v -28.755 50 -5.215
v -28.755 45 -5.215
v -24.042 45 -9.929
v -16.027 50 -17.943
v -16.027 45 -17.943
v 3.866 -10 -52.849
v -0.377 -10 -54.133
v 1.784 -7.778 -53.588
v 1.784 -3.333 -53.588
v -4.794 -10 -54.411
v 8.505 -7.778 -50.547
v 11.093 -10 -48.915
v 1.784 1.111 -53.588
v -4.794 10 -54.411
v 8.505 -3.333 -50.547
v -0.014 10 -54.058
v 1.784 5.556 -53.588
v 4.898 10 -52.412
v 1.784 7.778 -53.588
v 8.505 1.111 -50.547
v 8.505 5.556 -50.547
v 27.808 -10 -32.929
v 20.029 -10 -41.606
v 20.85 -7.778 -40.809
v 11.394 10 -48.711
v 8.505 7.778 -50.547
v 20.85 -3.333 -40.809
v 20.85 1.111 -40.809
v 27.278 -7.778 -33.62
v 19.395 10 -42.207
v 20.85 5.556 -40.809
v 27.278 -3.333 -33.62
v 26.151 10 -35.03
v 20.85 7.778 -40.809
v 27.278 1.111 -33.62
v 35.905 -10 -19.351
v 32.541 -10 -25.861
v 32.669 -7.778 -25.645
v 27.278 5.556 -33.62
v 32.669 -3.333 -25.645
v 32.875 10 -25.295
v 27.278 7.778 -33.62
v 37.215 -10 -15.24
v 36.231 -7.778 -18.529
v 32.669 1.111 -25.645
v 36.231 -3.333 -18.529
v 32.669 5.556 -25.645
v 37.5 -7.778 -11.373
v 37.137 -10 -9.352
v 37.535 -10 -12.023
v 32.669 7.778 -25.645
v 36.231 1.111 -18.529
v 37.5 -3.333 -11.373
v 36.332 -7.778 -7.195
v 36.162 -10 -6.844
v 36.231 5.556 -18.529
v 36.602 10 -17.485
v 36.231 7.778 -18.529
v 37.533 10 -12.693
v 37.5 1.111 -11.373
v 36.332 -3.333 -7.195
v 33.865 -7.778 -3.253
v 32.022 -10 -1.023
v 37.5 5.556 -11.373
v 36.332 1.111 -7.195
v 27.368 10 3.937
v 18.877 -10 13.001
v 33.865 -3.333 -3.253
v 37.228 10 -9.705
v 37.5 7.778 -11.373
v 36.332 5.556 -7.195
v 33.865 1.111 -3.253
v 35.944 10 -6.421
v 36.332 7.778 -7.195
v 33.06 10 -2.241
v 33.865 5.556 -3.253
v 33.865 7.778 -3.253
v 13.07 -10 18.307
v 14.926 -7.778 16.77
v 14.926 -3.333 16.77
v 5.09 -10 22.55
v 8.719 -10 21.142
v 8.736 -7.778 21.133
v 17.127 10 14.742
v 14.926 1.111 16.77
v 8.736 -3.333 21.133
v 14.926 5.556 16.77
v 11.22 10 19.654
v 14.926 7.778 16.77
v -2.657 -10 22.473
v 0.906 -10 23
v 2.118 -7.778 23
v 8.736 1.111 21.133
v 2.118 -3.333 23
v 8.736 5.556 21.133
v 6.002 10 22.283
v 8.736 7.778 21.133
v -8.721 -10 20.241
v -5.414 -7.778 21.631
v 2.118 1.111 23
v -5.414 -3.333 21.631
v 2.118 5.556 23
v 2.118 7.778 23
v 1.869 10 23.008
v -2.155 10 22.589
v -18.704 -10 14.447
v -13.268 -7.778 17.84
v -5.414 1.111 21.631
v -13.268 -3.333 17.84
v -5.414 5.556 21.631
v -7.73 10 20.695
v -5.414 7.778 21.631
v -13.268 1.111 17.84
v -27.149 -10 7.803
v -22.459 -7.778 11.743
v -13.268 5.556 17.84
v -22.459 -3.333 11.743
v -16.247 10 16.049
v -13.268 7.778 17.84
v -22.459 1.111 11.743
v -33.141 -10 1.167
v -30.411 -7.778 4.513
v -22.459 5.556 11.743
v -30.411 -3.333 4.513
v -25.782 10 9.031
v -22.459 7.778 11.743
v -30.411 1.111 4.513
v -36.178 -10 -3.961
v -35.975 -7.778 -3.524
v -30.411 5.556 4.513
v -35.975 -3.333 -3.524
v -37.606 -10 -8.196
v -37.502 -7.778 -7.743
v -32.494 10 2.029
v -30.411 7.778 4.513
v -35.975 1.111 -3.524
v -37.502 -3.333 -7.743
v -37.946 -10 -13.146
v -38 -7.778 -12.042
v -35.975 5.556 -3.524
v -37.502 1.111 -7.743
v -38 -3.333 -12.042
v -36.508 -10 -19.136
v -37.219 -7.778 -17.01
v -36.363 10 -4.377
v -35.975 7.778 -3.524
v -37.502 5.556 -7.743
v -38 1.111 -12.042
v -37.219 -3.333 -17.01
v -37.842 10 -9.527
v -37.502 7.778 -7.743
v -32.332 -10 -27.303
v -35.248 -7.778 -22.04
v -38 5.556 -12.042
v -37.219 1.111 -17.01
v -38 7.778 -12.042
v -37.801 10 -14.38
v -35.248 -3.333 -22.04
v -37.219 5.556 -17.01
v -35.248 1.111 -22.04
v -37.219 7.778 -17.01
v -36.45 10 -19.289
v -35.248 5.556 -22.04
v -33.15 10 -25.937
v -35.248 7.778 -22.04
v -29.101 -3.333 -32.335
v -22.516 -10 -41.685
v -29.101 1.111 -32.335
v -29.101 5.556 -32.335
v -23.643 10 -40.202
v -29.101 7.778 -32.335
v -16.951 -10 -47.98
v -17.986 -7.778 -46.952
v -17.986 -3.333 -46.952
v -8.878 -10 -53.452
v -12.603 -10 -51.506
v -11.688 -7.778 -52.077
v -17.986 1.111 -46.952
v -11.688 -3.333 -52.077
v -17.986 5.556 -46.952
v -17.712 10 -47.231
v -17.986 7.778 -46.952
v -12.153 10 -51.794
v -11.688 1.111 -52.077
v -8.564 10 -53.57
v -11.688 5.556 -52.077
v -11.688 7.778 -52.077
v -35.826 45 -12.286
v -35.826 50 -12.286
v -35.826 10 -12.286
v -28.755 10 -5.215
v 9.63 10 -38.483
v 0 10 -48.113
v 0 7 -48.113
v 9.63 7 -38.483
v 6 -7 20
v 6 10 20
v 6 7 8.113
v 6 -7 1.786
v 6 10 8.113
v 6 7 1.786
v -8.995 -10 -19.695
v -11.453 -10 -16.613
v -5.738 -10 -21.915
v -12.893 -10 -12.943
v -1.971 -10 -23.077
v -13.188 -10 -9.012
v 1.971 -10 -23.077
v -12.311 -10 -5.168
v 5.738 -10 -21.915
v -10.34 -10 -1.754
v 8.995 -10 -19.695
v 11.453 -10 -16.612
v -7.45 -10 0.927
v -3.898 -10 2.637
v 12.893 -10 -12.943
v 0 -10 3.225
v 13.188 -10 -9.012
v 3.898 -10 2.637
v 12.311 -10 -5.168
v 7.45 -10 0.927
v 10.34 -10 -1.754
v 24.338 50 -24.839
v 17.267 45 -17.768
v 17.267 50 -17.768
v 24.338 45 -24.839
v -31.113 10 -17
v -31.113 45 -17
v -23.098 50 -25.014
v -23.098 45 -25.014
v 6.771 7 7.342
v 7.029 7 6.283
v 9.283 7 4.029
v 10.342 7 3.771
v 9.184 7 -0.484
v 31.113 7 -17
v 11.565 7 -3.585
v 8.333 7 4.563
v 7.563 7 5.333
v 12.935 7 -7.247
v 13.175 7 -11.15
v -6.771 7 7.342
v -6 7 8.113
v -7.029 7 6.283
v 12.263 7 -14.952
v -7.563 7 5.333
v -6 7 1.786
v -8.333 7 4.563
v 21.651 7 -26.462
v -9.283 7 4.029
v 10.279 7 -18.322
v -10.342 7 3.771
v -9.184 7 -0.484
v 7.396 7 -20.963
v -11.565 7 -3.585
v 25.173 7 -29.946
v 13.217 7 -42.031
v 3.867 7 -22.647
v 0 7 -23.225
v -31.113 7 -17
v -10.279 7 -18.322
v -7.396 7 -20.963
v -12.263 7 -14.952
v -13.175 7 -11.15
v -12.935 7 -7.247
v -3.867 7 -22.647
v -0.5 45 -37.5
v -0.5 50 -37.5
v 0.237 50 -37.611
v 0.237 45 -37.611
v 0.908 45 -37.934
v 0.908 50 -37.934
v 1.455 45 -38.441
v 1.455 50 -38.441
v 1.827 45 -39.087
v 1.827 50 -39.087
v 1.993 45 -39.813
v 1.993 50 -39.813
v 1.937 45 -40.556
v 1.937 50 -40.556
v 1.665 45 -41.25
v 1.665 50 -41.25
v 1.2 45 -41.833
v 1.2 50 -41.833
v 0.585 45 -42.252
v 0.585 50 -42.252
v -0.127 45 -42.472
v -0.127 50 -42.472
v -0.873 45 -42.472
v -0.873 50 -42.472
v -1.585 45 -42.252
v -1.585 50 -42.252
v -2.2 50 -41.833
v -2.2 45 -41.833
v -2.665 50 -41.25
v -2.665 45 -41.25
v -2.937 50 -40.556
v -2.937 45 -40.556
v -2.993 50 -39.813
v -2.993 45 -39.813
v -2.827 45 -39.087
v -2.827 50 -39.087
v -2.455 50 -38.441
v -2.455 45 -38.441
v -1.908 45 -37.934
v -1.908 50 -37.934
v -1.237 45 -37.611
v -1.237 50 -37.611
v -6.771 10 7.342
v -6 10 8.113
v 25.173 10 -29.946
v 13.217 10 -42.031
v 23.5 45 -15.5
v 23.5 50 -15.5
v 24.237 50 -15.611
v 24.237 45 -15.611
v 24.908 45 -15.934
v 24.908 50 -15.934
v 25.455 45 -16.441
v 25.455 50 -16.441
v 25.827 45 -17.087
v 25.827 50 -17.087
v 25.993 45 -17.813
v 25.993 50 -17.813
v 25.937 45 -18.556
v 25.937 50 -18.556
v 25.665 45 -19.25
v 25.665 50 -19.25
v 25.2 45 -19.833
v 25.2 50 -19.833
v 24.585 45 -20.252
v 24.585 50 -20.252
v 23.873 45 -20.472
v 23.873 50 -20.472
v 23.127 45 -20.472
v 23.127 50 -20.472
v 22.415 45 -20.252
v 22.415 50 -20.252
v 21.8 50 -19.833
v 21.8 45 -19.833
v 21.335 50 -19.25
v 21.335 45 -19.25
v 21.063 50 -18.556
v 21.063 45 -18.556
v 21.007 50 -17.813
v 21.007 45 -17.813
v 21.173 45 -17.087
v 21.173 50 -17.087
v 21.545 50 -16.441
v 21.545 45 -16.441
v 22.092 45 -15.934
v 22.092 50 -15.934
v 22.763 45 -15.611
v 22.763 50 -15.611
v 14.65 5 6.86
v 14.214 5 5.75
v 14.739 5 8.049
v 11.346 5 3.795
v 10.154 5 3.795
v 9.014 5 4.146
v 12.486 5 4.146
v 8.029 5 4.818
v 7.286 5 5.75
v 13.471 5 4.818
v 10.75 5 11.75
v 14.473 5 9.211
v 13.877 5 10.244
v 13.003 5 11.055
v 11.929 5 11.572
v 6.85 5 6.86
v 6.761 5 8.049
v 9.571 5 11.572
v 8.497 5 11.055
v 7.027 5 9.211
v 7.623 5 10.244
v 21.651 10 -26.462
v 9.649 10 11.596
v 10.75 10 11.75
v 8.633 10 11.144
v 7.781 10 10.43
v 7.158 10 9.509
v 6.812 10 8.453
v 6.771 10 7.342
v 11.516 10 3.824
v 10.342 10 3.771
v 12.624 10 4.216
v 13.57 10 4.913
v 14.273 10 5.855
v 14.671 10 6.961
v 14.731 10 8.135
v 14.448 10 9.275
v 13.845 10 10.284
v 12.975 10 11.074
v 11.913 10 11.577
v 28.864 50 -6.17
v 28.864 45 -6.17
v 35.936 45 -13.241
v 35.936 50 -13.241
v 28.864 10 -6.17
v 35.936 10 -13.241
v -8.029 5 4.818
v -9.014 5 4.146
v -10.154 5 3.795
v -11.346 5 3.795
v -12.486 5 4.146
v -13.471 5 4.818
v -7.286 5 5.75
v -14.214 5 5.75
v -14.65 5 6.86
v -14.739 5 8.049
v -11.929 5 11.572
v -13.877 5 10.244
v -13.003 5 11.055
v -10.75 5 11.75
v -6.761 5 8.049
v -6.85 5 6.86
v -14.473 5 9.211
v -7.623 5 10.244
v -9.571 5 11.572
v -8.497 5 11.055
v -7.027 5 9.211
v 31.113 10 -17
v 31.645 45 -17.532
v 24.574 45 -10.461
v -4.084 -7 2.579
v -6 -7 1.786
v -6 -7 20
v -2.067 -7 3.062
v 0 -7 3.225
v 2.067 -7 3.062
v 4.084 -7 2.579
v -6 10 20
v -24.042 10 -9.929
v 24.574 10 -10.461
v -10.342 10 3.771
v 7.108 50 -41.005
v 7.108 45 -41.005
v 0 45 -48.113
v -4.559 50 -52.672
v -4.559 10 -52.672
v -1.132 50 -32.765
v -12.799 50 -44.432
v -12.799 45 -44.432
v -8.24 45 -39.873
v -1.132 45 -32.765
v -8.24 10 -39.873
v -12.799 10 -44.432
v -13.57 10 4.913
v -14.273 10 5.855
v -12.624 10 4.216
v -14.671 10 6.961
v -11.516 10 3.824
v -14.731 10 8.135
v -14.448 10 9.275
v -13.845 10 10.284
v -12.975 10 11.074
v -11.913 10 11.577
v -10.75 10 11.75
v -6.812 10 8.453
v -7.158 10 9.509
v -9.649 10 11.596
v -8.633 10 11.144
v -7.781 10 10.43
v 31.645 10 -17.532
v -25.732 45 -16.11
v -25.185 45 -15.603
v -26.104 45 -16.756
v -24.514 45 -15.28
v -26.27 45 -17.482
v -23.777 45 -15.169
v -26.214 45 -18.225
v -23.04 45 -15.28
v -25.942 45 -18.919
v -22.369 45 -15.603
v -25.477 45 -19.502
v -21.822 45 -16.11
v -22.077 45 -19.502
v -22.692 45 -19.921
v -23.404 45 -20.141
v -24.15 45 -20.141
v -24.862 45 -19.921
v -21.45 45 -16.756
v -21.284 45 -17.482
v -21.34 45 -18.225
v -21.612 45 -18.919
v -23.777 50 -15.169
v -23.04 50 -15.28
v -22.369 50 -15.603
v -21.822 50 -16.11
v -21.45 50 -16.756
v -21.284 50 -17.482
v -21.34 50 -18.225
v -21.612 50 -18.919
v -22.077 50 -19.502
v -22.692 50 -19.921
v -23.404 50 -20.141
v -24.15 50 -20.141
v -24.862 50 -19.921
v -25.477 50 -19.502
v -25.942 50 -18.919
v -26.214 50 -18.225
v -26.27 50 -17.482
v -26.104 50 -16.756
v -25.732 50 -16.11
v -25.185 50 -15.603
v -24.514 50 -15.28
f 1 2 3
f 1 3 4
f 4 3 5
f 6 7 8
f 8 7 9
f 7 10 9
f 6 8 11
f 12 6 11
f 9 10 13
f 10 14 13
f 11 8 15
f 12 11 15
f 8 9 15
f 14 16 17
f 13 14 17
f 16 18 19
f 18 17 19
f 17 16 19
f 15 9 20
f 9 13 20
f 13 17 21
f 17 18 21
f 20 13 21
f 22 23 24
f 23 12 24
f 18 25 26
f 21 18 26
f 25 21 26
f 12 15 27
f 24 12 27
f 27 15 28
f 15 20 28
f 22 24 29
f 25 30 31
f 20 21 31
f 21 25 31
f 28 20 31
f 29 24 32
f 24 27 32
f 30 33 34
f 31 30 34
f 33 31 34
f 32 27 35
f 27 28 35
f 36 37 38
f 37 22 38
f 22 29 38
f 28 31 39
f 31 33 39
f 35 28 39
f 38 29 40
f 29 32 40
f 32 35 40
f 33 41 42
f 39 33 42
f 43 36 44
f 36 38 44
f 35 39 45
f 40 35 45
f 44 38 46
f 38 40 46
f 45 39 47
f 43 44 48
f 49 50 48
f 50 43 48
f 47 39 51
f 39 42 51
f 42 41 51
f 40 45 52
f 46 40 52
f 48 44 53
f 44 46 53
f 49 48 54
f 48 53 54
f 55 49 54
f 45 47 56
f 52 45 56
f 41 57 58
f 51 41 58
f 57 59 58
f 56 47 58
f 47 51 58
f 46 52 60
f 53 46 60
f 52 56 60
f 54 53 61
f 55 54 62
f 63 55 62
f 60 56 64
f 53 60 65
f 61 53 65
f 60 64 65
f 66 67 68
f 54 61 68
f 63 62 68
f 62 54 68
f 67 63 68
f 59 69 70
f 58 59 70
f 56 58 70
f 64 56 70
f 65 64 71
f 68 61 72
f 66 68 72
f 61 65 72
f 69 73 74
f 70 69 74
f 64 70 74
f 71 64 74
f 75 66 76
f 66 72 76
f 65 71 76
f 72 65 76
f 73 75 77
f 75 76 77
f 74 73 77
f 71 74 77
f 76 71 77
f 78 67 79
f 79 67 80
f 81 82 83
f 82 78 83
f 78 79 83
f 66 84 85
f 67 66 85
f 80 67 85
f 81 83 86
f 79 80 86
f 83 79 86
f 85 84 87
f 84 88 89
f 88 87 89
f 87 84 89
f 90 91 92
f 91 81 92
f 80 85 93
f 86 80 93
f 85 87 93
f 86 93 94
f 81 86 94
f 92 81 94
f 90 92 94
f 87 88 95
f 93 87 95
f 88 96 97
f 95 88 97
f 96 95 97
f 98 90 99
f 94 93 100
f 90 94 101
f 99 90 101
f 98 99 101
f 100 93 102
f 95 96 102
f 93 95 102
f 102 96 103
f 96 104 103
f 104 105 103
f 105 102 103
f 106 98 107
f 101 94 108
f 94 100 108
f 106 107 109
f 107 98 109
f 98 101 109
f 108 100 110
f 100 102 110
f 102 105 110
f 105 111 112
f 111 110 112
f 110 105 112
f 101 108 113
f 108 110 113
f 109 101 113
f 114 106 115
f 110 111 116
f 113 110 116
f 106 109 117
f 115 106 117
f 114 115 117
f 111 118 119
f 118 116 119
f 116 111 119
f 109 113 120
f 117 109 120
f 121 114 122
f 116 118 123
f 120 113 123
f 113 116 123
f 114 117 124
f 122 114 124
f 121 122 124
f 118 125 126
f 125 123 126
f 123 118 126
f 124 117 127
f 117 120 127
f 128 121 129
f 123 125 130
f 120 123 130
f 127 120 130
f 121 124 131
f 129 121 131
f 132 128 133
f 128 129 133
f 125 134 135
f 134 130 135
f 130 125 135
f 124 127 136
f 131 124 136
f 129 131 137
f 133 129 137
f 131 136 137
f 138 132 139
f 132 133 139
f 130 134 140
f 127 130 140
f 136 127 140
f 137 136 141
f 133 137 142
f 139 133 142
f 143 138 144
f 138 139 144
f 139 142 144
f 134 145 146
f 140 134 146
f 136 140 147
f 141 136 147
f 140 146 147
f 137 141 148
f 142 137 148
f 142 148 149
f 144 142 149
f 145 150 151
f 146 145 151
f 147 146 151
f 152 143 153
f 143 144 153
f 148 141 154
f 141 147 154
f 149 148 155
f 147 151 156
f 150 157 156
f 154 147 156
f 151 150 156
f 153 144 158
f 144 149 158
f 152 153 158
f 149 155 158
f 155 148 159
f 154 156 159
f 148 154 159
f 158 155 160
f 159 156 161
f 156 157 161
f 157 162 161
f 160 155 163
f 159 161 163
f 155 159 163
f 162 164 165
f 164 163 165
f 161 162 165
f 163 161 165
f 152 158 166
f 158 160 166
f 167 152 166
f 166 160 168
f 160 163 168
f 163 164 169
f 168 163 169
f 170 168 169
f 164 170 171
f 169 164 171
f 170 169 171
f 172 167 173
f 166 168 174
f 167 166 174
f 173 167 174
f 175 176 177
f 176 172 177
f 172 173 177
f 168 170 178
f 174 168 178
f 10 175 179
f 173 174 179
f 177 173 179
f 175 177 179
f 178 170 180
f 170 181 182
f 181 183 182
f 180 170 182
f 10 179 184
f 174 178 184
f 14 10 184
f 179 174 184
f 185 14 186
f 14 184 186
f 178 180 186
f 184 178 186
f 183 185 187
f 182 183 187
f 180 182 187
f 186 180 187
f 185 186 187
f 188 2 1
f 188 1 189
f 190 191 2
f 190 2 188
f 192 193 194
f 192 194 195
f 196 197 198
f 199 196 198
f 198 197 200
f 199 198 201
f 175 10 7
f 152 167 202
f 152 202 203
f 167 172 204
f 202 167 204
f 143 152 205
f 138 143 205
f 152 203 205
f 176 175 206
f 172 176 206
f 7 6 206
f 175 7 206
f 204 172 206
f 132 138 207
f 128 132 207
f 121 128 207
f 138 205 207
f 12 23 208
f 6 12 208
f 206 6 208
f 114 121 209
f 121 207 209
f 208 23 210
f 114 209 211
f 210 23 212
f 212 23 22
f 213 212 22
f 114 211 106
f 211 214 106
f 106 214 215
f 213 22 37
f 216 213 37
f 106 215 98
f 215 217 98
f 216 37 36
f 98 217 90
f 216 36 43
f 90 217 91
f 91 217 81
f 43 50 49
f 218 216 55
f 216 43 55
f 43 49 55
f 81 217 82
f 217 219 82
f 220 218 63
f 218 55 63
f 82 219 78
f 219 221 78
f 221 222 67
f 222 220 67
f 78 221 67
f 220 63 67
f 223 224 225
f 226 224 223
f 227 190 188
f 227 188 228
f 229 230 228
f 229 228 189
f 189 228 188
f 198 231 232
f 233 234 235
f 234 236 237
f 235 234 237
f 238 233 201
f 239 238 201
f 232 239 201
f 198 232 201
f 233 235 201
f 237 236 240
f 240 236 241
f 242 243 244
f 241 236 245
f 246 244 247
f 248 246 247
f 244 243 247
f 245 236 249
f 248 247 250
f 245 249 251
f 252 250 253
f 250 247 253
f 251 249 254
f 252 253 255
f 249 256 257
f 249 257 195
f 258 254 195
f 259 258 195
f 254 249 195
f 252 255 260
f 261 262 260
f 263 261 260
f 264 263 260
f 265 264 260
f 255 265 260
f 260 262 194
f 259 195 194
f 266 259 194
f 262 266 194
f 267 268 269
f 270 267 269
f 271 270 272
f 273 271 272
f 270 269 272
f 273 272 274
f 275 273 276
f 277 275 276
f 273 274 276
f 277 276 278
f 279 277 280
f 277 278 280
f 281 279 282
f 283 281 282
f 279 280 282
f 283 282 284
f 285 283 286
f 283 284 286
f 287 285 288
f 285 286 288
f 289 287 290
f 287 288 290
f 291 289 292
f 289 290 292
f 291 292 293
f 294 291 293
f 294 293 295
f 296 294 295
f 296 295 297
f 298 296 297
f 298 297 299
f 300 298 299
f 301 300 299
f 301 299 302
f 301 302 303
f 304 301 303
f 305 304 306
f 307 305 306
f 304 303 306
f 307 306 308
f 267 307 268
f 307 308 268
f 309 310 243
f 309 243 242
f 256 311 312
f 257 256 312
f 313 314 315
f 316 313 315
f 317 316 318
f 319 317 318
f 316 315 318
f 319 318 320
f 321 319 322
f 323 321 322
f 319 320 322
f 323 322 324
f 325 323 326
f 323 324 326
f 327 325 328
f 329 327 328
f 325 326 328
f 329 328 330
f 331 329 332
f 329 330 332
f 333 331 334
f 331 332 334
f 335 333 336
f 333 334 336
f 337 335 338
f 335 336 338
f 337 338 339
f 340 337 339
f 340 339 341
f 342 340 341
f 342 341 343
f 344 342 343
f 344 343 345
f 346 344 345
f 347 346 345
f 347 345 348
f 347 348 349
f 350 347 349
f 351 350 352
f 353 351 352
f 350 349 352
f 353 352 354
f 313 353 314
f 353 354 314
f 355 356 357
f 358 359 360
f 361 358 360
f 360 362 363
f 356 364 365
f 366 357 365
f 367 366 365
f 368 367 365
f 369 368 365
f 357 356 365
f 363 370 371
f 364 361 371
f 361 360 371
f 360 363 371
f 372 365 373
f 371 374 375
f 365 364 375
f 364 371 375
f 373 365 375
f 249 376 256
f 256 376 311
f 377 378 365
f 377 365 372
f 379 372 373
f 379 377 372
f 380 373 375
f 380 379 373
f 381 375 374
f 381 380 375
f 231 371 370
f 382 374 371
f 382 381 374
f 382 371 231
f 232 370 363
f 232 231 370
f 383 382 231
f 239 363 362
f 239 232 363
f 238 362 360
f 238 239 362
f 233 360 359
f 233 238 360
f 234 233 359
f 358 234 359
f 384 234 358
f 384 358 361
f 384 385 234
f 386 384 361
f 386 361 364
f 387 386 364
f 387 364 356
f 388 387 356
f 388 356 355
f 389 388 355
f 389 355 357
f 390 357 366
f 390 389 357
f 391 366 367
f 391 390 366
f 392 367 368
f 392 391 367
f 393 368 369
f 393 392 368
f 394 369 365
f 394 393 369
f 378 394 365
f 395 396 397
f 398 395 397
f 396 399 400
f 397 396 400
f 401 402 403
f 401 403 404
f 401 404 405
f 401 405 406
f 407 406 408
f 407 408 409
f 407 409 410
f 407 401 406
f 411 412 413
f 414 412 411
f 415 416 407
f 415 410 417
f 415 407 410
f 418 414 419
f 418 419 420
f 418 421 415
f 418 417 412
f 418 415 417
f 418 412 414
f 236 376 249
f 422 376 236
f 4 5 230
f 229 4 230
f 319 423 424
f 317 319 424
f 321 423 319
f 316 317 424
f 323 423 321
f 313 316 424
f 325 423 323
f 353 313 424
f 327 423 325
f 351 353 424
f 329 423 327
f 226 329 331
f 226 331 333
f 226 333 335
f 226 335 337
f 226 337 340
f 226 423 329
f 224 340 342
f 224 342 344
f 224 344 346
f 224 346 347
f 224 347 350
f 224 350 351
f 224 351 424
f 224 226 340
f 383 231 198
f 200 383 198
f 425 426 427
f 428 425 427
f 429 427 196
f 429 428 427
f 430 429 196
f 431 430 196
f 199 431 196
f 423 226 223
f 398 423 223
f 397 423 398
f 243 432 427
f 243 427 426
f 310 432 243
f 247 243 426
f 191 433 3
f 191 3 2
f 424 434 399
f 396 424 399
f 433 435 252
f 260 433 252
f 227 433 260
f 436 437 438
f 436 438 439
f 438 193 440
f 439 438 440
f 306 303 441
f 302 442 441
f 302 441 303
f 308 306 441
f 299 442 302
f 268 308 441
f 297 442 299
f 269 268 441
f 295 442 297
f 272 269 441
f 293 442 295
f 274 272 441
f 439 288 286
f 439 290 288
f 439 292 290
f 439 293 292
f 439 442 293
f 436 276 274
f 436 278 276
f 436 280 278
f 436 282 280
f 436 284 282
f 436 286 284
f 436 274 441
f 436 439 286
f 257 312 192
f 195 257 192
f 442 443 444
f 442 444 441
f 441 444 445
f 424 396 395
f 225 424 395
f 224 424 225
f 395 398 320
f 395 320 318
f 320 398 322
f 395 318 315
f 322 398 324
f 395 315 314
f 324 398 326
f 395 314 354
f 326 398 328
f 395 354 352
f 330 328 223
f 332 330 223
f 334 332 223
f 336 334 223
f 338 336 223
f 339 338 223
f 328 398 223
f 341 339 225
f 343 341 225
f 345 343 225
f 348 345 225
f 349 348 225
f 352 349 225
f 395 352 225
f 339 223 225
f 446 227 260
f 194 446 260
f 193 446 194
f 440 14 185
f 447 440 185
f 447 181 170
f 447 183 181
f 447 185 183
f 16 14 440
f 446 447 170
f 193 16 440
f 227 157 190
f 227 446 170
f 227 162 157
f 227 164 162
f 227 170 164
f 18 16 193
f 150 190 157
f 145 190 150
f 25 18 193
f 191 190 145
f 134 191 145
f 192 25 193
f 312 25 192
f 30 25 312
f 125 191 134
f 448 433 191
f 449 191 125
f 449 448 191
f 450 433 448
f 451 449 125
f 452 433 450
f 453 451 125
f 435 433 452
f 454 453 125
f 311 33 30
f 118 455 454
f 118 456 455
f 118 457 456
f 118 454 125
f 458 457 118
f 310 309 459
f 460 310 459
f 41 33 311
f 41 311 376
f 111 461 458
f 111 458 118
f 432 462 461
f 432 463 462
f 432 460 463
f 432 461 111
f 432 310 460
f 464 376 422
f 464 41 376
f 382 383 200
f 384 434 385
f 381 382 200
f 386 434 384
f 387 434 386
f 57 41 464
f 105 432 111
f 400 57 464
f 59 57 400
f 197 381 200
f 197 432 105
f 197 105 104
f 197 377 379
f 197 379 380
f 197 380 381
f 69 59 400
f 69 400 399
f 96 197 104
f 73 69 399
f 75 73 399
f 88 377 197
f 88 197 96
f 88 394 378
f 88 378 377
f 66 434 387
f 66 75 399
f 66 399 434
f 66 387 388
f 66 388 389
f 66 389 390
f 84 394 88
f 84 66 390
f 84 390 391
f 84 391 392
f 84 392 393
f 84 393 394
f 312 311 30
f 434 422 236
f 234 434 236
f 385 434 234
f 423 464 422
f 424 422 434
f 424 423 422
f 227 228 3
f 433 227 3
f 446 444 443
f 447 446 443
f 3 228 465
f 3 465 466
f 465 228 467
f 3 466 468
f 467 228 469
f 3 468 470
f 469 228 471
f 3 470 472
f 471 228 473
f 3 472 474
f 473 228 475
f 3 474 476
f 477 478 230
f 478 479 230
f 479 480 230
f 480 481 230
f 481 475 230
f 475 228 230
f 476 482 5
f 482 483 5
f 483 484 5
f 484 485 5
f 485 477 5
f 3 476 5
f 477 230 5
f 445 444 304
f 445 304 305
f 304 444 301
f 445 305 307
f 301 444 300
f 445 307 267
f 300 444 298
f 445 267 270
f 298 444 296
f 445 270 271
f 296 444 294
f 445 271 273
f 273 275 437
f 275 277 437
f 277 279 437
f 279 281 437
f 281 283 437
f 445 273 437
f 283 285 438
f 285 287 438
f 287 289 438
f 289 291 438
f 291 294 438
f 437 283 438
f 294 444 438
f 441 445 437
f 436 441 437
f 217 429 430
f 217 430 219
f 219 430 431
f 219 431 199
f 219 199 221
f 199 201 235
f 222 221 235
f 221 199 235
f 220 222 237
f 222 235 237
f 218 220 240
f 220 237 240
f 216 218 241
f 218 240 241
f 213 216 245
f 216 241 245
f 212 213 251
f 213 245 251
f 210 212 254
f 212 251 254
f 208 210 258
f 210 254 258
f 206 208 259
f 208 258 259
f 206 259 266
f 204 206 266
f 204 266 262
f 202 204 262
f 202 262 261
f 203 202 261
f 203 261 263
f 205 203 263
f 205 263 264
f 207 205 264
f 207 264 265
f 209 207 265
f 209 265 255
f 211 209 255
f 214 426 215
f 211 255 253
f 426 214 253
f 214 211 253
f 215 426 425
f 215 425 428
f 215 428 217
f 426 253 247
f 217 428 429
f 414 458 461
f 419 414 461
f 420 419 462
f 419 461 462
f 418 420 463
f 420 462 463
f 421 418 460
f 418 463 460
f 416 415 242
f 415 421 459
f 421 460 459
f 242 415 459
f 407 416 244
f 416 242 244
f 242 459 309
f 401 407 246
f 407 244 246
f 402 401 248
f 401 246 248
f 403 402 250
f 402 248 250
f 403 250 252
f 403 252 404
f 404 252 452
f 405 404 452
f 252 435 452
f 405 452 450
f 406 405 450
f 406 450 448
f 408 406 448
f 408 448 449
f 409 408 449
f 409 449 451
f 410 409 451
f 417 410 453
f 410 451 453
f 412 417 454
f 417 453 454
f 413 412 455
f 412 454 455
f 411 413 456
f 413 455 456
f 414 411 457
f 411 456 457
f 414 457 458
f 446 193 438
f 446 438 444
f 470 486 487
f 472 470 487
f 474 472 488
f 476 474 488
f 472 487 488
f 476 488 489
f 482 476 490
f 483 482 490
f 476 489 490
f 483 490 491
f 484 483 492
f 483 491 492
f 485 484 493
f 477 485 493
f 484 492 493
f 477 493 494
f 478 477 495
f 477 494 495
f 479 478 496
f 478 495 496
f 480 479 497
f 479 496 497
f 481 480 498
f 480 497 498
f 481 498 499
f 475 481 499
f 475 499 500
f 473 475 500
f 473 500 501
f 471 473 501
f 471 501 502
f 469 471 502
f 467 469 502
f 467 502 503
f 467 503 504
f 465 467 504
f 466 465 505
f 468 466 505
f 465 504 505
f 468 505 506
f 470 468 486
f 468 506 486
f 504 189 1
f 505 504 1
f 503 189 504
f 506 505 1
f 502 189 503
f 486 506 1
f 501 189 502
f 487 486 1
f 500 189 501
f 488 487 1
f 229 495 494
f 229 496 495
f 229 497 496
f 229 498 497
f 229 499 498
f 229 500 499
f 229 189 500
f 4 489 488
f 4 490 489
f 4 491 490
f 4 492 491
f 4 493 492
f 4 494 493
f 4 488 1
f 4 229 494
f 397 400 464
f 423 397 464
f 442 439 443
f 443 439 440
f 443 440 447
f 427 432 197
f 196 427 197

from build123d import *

# Parameters (mm, degrees)
BOSS_EXTRUDE1_DEPTH      = 10
BOSS_EXTRUDE1_DEPTH_BACK = 10
SKETCH2_R                = 60
SKETCH7_R                = 4
CUT_EXTRUDE2_DEPTH       = 5
CUT_EXTRUDE4_DEPTH       = 3
CUT_EXTRUDE5_DEPTH       = 3
BOSS_EXTRUDE2_DEPTH      = 35
BOSS_EXTRUDE3_DEPTH      = 5
SKETCH13_R               = 2.5
CUT_EXTRUDE7_DEPTH       = 5
SKETCH15_R               = 2.5
CUT_EXTRUDE8_DEPTH       = 5
SKETCH14_R               = 2.5
CUT_EXTRUDE9_DEPTH       = 5
SKETCH16_R               = 60
CUT_EXTRUDE10_DEPTH      = 38
SKETCH4_R                = 13.225
CUT_EXTRUDE12_DEPTH      = 42
SKETCH19_W               = 12
SKETCH19_H               = 20
CUT_EXTRUDE13_DEPTH      = 17


with BuildPart() as part:
    # Sketch2 → Boss-Extrude1 (new, two sides: drawn at the far end of the back side and taken through both)
    with BuildSketch(Plane(origin=(0, 0, 0), x_dir=(1, 0, 0), z_dir=(0, 1, 0)).offset(-BOSS_EXTRUDE1_DEPTH_BACK)):
        with Locations(Location((0, 0, 0), (0, 0, 270))):
            Circle(SKETCH2_R)
    extrude(amount=BOSS_EXTRUDE1_DEPTH + BOSS_EXTRUDE1_DEPTH_BACK)

    # Sketch7 → Cut-Extrude2 (cut)
    with BuildSketch(Plane(origin=(0, 10, 0), x_dir=(1, 0, 0), z_dir=(0, 1, 0))):
        with Locations(Location((-10.75, -7.75, 0), (0, 0, 270))):
            Circle(SKETCH7_R)
    cut_extrude2 = extrude(amount=-CUT_EXTRUDE2_DEPTH, mode=Mode.SUBTRACT)

    # Mirror1: Cut-Extrude2 across plane
    add(cut_extrude2.mirror(Plane(origin=(0, 0, 0), x_dir=(0, 0, 1), z_dir=(1, 0, 0))), mode=Mode.SUBTRACT)

    # Sketch9 → Cut-Extrude4 (cut)
    with BuildSketch(Plane(origin=(0, 10, 0), x_dir=(1, 0, 0), z_dir=(0, 1, 0))):
        Polygon((-31.112706744, 17), (-8.372e-06, 48.112698372), (31.11269, 17), (-8.372e-06, -14.112698372), align=None)
    extrude(amount=-CUT_EXTRUDE4_DEPTH, mode=Mode.SUBTRACT)

    # Sketch6 → Cut-Extrude5 (cut)
    with BuildSketch(Plane(origin=(0, 10, 0), x_dir=(1, 0, 0), z_dir=(0, 1, 0))):
        Polygon((-5.977874391, 23.042765738), (5.977874391, 10.957234262), (25.17254203, 29.945776443), (13.216793249, 42.03130792), align=None)
    extrude(amount=-CUT_EXTRUDE5_DEPTH, mode=Mode.SUBTRACT)

    # Sketch11 → Boss-Extrude2 (add)
    with BuildSketch(Plane(origin=(0, 10, 0), x_dir=(1, 0, 0), z_dir=(0, 1, 0))):
        Polygon((-8.372e-06, 48.112698372), (-8.240017503, 39.872689242), (-12.799306685, 44.431978425), (-4.559297555, 52.671987555), align=None)
        Polygon((-31.112706744, 17), (-24.041638933, 9.928932188), (-28.755220541, 5.21535058), (-35.826288353, 12.286418392), align=None)
        Polygon((31.644591703, 17.531901703), (24.573523891, 10.460833891), (28.864455193, 6.169902588), (35.935523005, 13.2409704), align=None)
    extrude(amount=BOSS_EXTRUDE2_DEPTH)

    # Sketch12 → Boss-Extrude3 (add)
    with BuildSketch(Plane(origin=(0, 45, 0), x_dir=(1, 0, 0), z_dir=(0, 1, 0))):
        Polygon((-4.559297555, 52.671987555), (-12.799306685, 44.431978425), (-1.132044796, 32.764716535), (7.107964335, 41.004725665), align=None)
        Polygon((-35.826288353, 12.286418392), (-28.755220541, 5.21535058), (-16.027298479, 17.943272641), (-23.098366291, 25.014340453), align=None)
        Polygon((35.935523005, 13.2409704), (28.864455193, 6.169902588), (17.266701717, 17.767656064), (24.337769529, 24.838723876), align=None)
    extrude(amount=BOSS_EXTRUDE3_DEPTH)

    # Sketch13 → Cut-Extrude7 (cut)
    with BuildSketch(Plane(origin=(0, 50, 0), x_dir=(1, 0, 0), z_dir=(0, 1, 0))):
        with Locations(Location((-0.5, 40, 0), (0, 0, 270))):
            Circle(SKETCH13_R)
    extrude(amount=-CUT_EXTRUDE7_DEPTH, mode=Mode.SUBTRACT)

    # Sketch15 → Cut-Extrude8 (cut)
    with BuildSketch(Plane(origin=(0, 50, 0), x_dir=(1, 0, 0), z_dir=(0, 1, 0))):
        with Locations(Location((-23.777002133, 17.668993601, 0), (0, 0, 270))):
            Circle(SKETCH15_R)
    extrude(amount=-CUT_EXTRUDE8_DEPTH, mode=Mode.SUBTRACT)

    # Sketch14 → Cut-Extrude9 (cut)
    with BuildSketch(Plane(origin=(0, 50, 0), x_dir=(1, 0, 0), z_dir=(0, 1, 0))):
        with Locations(Location((23.5, 18, 0), (0, 0, 270))):
            Circle(SKETCH14_R)
    extrude(amount=-CUT_EXTRUDE9_DEPTH, mode=Mode.SUBTRACT)

    # Sketch16 → Cut-Extrude10 (cut)
    with BuildSketch(Plane(origin=(0, 10, 0), x_dir=(1, 0, 0), z_dir=(0, 1, 0))):
        Circle(SKETCH16_R)
        with BuildLine():
            add(Edge.make_bspline(
                [(-4.79445414, 54.411479542), (3.711953261, 55.123778385), (20.176812176, 43.163893552), (32.095851639, 27.739664068), (41.103501035, 9.384731909), (23.441378071, -7.012281145), (7.387216057, -27.669539214), (-20.675561177, -15.265601832), (-45.215914175, 6.863059518), (-27.534475147, 35.312307502), (-14.416385352, 53.60577037), (-4.79445414, 54.411479542)],
                knots=[0, 0, 0, 0, 0.129983166, 0.216069769, 0.283536175, 0.368923683, 0.507401419, 0.580069943, 0.753753629, 0.852970941, 1, 1, 1, 1], degree=3))
        make_face(mode=Mode.SUBTRACT)
    extrude(amount=-CUT_EXTRUDE10_DEPTH, mode=Mode.SUBTRACT)

    # Sketch4 → Cut-Extrude12 (cut)
    with BuildSketch(Plane(origin=(0, 10, 0), x_dir=(1, 0, 0), z_dir=(0, 1, 0))):
        with Locations(Location((0, 10, 0), (0, 0, 270))):
            Circle(SKETCH4_R)
    extrude(amount=-CUT_EXTRUDE12_DEPTH, mode=Mode.SUBTRACT)

    # Sketch19 → Cut-Extrude13 (cut)
    with BuildSketch(Plane(origin=(0, 10, 0), x_dir=(1, 0, 0), z_dir=(0, 1, 0))):
        with Locations((0, -10)):
            Rectangle(SKETCH19_W, SKETCH19_H)
    extrude(amount=-CUT_EXTRUDE13_DEPTH, mode=Mode.SUBTRACT)


solid = part.part
